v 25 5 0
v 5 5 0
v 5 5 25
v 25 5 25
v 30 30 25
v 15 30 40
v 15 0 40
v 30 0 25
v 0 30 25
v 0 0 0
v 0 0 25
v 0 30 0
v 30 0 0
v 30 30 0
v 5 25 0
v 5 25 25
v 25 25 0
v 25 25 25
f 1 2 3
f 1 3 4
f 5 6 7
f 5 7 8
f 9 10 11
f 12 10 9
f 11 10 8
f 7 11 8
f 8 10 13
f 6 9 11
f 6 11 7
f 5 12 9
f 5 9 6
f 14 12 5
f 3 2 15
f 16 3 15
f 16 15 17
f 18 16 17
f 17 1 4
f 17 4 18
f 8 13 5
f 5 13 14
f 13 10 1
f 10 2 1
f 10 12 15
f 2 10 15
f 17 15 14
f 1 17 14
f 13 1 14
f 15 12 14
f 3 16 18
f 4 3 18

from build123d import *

# Parameters (mm, degrees)
F0_W        = 30
F0_H        = 30
F0_W_2      = 20
F0_H_2      = 20
F1_DEPTH    = 25
F2_W        = 30
F2_H        = 30
F3_DEPTH    = 25
F4_T1_DEPTH = 158.5841493983


# Not quite as in the source:
# - a fillet or chamfer that OpenCascade refuses, or shapes differently, is made with other operations: its cross-section is extruded or revolved along the edge and cut away or added


with BuildPart() as f1:
    # F0 (on Top) → F1 (new body)
    with BuildSketch(Plane.XY):
        with Locations((15, 15)):
            Rectangle(F0_W, F0_H)
        with Locations((15, 15)):
            Rectangle(F0_W_2, F0_H_2, mode=Mode.SUBTRACT)
    extrude(amount=F1_DEPTH)

    # F2 (on face) → F3 (join)
    with BuildSketch(Plane.XY.offset(25)):
        with Locations((15, 15)):
            Rectangle(F2_W, F2_H)
    extrude(amount=F3_DEPTH)

    # F4: chamfer of 25 on 2 edges, made by hand

    # F4_s2 → F4_t1 (cut)
    with BuildSketch(Plane.XZ.offset(-94.2920746991)):
        Polygon((0, 25), (25, 50), (0, 50), align=None)
        Polygon((5, 50), (30, 25), (30, 50), align=None)
    extrude(amount=F4_T1_DEPTH, mode=Mode.SUBTRACT)


solid = f1.part
